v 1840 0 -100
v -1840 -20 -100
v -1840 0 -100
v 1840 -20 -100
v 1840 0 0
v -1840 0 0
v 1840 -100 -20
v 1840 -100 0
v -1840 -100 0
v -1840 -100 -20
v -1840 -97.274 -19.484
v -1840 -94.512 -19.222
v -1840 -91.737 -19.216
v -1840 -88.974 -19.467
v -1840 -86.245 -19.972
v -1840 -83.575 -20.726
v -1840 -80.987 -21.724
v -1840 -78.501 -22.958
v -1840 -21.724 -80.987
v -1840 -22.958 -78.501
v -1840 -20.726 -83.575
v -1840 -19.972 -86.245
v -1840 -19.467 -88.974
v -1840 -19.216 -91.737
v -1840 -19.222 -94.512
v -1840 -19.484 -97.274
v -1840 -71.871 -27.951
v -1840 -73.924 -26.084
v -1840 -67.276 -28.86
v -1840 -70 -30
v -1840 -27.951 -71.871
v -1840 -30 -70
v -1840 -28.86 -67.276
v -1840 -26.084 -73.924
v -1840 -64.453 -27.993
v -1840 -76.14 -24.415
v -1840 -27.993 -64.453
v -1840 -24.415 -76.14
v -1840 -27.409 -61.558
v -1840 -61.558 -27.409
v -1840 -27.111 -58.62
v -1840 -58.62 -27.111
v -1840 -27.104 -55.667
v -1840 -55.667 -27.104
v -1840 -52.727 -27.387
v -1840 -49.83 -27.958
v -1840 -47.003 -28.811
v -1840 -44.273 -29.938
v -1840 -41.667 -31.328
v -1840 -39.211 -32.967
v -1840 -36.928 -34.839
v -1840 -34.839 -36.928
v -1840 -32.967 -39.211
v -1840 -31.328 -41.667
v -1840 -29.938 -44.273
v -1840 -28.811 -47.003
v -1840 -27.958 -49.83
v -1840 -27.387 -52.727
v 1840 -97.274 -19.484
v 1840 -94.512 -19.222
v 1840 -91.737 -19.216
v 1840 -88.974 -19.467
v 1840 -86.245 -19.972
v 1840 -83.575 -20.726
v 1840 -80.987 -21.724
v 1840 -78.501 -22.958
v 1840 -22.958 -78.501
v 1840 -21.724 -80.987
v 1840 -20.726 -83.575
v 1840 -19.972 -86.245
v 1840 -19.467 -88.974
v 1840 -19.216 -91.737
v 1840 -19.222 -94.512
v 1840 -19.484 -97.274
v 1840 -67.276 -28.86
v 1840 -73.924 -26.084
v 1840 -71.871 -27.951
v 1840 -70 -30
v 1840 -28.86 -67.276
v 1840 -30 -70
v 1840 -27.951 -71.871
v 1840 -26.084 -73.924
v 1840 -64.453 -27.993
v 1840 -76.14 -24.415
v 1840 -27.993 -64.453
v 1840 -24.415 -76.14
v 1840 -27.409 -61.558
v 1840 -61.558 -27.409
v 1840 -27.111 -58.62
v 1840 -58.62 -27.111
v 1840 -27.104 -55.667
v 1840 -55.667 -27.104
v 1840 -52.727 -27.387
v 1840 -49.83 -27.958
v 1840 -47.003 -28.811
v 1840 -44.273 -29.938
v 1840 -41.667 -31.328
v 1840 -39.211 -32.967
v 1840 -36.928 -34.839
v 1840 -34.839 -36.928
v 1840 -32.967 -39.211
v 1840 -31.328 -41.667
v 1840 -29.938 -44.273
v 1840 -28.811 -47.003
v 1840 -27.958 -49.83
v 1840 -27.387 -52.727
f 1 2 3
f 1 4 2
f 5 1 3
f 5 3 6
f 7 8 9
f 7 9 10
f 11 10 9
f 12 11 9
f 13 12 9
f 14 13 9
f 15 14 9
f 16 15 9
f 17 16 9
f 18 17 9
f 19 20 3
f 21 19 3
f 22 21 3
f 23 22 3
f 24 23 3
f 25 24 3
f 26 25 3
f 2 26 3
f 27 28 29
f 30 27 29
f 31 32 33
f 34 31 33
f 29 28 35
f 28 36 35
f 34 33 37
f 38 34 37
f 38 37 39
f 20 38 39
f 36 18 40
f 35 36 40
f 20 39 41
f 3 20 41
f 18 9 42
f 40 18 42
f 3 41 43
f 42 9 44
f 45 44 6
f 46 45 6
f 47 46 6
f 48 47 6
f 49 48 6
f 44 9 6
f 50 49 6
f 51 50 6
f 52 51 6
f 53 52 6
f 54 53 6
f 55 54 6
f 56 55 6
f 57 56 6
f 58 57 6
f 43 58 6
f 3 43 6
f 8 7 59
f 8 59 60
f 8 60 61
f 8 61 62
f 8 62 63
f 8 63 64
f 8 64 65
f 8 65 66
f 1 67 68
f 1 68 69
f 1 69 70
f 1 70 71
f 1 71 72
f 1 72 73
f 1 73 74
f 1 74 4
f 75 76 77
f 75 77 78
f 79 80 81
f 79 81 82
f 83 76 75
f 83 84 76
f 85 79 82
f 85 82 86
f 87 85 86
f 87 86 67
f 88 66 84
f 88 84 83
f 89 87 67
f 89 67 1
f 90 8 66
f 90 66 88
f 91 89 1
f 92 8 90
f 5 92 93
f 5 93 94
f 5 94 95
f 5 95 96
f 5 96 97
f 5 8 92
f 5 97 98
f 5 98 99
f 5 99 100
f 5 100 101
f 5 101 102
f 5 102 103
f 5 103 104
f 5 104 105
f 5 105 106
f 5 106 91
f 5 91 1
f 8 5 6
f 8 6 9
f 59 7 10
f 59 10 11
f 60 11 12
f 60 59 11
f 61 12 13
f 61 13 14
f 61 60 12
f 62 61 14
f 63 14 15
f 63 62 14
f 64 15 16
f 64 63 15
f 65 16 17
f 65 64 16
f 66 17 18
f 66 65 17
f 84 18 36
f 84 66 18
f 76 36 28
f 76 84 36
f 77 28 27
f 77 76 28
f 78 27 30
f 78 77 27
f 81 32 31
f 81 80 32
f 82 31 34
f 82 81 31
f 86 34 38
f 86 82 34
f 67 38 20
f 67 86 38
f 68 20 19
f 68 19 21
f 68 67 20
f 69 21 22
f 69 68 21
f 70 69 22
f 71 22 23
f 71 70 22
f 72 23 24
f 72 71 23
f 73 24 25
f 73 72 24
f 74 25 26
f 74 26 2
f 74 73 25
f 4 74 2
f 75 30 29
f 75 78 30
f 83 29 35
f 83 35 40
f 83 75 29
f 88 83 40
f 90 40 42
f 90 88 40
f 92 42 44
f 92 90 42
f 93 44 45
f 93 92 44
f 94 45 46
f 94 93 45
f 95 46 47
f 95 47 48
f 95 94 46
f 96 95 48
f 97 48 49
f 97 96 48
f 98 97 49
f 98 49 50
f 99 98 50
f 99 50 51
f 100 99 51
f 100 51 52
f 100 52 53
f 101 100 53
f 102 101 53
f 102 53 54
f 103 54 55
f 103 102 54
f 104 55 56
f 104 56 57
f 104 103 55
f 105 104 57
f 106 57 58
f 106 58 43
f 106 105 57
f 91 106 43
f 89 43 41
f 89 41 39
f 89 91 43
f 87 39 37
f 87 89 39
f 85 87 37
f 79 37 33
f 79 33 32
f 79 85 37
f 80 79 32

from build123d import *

# Parameters (mm, degrees)
F1_DEPTH = 1840


with BuildPart() as f1:
    # F0 (on Right) → F1 (new body, symmetric)
    with BuildSketch(Plane.YZ):
        with BuildLine():
            Line((-20, -100), (0, -100))
            Line((0, -100), (0, 0))
            Line((0, 0), (-100, 0))
            Line((-100, 0), (-100, -20))
            ThreePointArc((-100, -20), (-83.575425, -20.726274), (-70, -30))
            ThreePointArc((-70, -30), (-35.857864, -35.857864), (-30, -70))
            ThreePointArc((-30, -70), (-20.726274, -83.575425), (-20, -100))
        make_face()
    extrude(amount=F1_DEPTH, both=True)


solid = f1.part
